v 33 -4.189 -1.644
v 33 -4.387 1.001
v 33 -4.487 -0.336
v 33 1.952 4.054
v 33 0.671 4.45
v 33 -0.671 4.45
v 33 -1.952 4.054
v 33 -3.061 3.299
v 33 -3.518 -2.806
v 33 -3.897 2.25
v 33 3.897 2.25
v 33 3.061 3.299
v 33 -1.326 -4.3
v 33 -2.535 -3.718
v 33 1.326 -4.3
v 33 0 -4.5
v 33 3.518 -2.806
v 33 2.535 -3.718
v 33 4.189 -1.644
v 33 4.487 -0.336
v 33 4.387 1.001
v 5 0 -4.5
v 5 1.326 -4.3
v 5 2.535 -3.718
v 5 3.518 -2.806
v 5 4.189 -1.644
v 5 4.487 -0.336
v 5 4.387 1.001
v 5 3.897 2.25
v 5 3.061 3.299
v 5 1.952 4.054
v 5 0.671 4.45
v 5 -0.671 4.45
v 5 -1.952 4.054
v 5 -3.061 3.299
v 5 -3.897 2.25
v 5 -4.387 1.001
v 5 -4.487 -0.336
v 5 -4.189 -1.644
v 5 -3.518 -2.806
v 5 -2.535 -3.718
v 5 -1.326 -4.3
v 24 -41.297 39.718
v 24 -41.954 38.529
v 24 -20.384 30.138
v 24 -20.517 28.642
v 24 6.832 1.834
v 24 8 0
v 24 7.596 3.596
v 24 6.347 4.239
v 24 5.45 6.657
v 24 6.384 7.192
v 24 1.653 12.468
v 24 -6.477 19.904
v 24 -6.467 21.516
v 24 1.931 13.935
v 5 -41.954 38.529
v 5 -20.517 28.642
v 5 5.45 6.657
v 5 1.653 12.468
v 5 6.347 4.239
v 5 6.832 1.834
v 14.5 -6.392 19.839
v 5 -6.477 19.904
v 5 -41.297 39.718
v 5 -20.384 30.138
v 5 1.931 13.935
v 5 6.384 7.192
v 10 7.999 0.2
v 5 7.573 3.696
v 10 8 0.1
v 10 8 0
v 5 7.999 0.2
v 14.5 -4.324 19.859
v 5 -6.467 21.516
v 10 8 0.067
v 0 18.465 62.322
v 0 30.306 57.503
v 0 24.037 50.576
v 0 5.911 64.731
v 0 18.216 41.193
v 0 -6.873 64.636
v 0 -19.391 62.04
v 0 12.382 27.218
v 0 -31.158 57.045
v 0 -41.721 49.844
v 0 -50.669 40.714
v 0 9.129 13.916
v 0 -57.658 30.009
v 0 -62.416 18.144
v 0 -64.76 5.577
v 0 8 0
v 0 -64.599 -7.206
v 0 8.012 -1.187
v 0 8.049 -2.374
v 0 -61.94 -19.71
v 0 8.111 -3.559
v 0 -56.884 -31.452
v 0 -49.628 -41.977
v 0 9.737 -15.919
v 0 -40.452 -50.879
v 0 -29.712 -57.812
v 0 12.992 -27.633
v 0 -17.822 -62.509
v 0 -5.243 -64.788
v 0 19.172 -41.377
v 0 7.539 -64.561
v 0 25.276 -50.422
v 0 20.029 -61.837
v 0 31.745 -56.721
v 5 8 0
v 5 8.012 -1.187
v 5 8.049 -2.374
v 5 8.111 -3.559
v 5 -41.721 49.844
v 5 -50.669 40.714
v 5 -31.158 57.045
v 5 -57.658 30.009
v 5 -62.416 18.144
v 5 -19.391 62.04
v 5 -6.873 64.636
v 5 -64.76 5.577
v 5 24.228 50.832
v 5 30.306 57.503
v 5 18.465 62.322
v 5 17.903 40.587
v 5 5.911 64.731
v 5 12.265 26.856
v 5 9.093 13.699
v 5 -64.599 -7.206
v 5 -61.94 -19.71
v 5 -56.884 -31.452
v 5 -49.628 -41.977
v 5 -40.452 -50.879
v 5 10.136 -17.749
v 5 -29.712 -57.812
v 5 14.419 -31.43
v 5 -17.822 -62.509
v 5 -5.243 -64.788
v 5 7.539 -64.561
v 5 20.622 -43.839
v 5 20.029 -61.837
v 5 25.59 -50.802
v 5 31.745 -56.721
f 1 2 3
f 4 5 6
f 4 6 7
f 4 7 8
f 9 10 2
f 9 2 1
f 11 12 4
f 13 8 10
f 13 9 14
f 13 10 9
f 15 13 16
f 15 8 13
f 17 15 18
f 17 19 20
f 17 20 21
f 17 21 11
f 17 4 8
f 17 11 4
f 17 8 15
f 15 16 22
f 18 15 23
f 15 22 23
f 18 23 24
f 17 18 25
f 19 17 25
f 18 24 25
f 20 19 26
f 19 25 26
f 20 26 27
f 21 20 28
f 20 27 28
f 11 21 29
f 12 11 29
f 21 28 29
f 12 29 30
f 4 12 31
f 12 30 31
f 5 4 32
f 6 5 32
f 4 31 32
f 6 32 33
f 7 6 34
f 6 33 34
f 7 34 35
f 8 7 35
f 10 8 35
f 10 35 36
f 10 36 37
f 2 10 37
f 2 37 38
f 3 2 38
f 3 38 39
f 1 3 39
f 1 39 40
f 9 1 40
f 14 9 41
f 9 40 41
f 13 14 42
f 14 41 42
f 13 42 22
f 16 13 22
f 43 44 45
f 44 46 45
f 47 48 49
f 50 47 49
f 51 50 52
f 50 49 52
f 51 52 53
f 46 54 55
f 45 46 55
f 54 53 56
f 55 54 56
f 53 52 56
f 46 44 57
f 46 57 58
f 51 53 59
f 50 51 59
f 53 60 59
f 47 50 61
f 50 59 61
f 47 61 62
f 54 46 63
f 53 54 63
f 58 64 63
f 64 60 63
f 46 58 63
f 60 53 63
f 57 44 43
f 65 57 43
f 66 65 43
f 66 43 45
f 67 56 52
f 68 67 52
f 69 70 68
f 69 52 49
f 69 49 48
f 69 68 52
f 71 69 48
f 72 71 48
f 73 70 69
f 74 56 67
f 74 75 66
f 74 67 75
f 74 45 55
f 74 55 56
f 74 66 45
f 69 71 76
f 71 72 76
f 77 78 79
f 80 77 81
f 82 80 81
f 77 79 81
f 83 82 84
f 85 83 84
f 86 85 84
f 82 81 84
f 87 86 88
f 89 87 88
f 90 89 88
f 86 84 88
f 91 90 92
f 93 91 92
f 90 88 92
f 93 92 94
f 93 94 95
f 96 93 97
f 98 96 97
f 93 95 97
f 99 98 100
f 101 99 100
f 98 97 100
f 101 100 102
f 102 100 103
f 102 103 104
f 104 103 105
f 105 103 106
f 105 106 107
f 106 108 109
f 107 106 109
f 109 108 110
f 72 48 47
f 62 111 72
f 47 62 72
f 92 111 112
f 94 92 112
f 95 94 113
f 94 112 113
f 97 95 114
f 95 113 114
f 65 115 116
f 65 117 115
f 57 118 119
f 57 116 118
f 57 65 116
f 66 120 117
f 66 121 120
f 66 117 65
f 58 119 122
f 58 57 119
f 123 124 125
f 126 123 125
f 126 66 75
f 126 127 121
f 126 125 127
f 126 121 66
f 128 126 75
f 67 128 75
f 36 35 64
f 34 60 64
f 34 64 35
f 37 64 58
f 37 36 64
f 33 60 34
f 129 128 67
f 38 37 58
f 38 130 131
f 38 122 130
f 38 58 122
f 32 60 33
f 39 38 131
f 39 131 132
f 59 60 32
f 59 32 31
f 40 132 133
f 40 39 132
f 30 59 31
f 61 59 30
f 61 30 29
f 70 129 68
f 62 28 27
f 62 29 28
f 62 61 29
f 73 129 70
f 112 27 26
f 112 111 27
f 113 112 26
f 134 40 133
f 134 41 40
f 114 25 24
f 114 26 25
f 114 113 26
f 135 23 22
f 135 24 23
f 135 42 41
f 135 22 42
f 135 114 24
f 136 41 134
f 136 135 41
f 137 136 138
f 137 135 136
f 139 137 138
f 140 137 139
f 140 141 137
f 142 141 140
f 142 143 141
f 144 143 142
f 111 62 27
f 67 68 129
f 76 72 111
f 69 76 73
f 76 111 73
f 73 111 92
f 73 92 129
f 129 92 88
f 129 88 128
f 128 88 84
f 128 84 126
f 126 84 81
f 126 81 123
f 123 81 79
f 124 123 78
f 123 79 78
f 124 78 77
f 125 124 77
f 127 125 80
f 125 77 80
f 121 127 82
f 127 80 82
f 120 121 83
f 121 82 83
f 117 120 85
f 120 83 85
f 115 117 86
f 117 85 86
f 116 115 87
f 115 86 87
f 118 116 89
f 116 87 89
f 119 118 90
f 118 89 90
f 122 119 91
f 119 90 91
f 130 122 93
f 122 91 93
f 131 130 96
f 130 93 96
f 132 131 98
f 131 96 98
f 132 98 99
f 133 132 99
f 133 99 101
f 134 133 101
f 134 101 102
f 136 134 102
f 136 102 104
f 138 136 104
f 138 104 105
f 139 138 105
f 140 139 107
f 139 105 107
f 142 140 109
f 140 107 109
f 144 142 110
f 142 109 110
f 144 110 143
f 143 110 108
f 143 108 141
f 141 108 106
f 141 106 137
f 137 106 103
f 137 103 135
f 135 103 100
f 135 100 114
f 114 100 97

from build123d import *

# Parameters (mm, degrees)
SKETCH1_R           = 65
BOSS_EXTRUDE1_DEPTH = 5
SKETCH2_R           = 57
CUT_EXTRUDE1_DEPTH  = 5
SKETCH3_R           = 4.5
BOSS_EXTRUDE2_DEPTH = 28
BOSS_EXTRUDE3_DEPTH = 19
CUT_EXTRUDE2_DEPTH  = 10


with BuildPart() as part:
    # Sketch1 → Boss-Extrude1 (new body)
    with BuildSketch(Plane(origin=(0, 0, 0), x_dir=(0, 0, -1), z_dir=(1, 0, 0))):
        Circle(SKETCH1_R)
    extrude(amount=BOSS_EXTRUDE1_DEPTH)

    # Sketch2 → Cut-Extrude1 (cut)
    with BuildSketch(Plane(origin=(5, 0, 0), x_dir=(0, 0, -1), z_dir=(1, 0, 0))):
        with Locations((0, 65)):
            Circle(SKETCH2_R)
    extrude(amount=-CUT_EXTRUDE1_DEPTH, mode=Mode.SUBTRACT)

    # Sketch3 → Boss-Extrude2 (add)
    with BuildSketch(Plane(origin=(5, 0, 0), x_dir=(0, 0, -1), z_dir=(1, 0, 0))):
        Circle(SKETCH3_R)
    extrude(amount=BOSS_EXTRUDE2_DEPTH)

    # Sketch4 → Boss-Extrude3 (add)
    with BuildSketch(Plane(origin=(5, 0, 0), x_dir=(0, 0, -1), z_dir=(1, 0, 0))):
        with BuildLine():
            Line((-38.528819584, -41.954177593), (-39.717618419, -41.296537903))
            add(Edge.make_bspline(
                [(-39.717618419, -41.296537903), (-19.85880921, 8), (0, 8)],
                knots=[0, 0, 0, 1, 1, 1], degree=2))
            Line((0, 8), (-1.834255985, 6.832495808))
            add(Edge.make_bspline(
                [(-38.528819584, -41.954177593), (-19.49735867, 4.777398316), (-1.834255985, 6.832495808)],
                knots=[0, 0, 0, 1, 1, 1], degree=2))
        make_face()
    extrude(amount=BOSS_EXTRUDE3_DEPTH)

    # Sketch5 → Cut-Extrude2 (cut)
    with BuildSketch(Plane.ZY):
        with BuildLine():
            add(Edge.make_bspline(
                [(-59.611313459, 41.161832135), (-62.271021167, 28.272133344), (0.725304908, -12.45080433), (121.126777355, 64.589791019), (-54.876290799, 64.109096486), (-59.611313459, 41.161832135)],
                knots=[0, 0, 0, 0, 0.262262558, 0.533099388, 1, 1, 1, 1], degree=3))
        make_face()
    extrude(amount=-CUT_EXTRUDE2_DEPTH, mode=Mode.SUBTRACT)


solid = part.part
